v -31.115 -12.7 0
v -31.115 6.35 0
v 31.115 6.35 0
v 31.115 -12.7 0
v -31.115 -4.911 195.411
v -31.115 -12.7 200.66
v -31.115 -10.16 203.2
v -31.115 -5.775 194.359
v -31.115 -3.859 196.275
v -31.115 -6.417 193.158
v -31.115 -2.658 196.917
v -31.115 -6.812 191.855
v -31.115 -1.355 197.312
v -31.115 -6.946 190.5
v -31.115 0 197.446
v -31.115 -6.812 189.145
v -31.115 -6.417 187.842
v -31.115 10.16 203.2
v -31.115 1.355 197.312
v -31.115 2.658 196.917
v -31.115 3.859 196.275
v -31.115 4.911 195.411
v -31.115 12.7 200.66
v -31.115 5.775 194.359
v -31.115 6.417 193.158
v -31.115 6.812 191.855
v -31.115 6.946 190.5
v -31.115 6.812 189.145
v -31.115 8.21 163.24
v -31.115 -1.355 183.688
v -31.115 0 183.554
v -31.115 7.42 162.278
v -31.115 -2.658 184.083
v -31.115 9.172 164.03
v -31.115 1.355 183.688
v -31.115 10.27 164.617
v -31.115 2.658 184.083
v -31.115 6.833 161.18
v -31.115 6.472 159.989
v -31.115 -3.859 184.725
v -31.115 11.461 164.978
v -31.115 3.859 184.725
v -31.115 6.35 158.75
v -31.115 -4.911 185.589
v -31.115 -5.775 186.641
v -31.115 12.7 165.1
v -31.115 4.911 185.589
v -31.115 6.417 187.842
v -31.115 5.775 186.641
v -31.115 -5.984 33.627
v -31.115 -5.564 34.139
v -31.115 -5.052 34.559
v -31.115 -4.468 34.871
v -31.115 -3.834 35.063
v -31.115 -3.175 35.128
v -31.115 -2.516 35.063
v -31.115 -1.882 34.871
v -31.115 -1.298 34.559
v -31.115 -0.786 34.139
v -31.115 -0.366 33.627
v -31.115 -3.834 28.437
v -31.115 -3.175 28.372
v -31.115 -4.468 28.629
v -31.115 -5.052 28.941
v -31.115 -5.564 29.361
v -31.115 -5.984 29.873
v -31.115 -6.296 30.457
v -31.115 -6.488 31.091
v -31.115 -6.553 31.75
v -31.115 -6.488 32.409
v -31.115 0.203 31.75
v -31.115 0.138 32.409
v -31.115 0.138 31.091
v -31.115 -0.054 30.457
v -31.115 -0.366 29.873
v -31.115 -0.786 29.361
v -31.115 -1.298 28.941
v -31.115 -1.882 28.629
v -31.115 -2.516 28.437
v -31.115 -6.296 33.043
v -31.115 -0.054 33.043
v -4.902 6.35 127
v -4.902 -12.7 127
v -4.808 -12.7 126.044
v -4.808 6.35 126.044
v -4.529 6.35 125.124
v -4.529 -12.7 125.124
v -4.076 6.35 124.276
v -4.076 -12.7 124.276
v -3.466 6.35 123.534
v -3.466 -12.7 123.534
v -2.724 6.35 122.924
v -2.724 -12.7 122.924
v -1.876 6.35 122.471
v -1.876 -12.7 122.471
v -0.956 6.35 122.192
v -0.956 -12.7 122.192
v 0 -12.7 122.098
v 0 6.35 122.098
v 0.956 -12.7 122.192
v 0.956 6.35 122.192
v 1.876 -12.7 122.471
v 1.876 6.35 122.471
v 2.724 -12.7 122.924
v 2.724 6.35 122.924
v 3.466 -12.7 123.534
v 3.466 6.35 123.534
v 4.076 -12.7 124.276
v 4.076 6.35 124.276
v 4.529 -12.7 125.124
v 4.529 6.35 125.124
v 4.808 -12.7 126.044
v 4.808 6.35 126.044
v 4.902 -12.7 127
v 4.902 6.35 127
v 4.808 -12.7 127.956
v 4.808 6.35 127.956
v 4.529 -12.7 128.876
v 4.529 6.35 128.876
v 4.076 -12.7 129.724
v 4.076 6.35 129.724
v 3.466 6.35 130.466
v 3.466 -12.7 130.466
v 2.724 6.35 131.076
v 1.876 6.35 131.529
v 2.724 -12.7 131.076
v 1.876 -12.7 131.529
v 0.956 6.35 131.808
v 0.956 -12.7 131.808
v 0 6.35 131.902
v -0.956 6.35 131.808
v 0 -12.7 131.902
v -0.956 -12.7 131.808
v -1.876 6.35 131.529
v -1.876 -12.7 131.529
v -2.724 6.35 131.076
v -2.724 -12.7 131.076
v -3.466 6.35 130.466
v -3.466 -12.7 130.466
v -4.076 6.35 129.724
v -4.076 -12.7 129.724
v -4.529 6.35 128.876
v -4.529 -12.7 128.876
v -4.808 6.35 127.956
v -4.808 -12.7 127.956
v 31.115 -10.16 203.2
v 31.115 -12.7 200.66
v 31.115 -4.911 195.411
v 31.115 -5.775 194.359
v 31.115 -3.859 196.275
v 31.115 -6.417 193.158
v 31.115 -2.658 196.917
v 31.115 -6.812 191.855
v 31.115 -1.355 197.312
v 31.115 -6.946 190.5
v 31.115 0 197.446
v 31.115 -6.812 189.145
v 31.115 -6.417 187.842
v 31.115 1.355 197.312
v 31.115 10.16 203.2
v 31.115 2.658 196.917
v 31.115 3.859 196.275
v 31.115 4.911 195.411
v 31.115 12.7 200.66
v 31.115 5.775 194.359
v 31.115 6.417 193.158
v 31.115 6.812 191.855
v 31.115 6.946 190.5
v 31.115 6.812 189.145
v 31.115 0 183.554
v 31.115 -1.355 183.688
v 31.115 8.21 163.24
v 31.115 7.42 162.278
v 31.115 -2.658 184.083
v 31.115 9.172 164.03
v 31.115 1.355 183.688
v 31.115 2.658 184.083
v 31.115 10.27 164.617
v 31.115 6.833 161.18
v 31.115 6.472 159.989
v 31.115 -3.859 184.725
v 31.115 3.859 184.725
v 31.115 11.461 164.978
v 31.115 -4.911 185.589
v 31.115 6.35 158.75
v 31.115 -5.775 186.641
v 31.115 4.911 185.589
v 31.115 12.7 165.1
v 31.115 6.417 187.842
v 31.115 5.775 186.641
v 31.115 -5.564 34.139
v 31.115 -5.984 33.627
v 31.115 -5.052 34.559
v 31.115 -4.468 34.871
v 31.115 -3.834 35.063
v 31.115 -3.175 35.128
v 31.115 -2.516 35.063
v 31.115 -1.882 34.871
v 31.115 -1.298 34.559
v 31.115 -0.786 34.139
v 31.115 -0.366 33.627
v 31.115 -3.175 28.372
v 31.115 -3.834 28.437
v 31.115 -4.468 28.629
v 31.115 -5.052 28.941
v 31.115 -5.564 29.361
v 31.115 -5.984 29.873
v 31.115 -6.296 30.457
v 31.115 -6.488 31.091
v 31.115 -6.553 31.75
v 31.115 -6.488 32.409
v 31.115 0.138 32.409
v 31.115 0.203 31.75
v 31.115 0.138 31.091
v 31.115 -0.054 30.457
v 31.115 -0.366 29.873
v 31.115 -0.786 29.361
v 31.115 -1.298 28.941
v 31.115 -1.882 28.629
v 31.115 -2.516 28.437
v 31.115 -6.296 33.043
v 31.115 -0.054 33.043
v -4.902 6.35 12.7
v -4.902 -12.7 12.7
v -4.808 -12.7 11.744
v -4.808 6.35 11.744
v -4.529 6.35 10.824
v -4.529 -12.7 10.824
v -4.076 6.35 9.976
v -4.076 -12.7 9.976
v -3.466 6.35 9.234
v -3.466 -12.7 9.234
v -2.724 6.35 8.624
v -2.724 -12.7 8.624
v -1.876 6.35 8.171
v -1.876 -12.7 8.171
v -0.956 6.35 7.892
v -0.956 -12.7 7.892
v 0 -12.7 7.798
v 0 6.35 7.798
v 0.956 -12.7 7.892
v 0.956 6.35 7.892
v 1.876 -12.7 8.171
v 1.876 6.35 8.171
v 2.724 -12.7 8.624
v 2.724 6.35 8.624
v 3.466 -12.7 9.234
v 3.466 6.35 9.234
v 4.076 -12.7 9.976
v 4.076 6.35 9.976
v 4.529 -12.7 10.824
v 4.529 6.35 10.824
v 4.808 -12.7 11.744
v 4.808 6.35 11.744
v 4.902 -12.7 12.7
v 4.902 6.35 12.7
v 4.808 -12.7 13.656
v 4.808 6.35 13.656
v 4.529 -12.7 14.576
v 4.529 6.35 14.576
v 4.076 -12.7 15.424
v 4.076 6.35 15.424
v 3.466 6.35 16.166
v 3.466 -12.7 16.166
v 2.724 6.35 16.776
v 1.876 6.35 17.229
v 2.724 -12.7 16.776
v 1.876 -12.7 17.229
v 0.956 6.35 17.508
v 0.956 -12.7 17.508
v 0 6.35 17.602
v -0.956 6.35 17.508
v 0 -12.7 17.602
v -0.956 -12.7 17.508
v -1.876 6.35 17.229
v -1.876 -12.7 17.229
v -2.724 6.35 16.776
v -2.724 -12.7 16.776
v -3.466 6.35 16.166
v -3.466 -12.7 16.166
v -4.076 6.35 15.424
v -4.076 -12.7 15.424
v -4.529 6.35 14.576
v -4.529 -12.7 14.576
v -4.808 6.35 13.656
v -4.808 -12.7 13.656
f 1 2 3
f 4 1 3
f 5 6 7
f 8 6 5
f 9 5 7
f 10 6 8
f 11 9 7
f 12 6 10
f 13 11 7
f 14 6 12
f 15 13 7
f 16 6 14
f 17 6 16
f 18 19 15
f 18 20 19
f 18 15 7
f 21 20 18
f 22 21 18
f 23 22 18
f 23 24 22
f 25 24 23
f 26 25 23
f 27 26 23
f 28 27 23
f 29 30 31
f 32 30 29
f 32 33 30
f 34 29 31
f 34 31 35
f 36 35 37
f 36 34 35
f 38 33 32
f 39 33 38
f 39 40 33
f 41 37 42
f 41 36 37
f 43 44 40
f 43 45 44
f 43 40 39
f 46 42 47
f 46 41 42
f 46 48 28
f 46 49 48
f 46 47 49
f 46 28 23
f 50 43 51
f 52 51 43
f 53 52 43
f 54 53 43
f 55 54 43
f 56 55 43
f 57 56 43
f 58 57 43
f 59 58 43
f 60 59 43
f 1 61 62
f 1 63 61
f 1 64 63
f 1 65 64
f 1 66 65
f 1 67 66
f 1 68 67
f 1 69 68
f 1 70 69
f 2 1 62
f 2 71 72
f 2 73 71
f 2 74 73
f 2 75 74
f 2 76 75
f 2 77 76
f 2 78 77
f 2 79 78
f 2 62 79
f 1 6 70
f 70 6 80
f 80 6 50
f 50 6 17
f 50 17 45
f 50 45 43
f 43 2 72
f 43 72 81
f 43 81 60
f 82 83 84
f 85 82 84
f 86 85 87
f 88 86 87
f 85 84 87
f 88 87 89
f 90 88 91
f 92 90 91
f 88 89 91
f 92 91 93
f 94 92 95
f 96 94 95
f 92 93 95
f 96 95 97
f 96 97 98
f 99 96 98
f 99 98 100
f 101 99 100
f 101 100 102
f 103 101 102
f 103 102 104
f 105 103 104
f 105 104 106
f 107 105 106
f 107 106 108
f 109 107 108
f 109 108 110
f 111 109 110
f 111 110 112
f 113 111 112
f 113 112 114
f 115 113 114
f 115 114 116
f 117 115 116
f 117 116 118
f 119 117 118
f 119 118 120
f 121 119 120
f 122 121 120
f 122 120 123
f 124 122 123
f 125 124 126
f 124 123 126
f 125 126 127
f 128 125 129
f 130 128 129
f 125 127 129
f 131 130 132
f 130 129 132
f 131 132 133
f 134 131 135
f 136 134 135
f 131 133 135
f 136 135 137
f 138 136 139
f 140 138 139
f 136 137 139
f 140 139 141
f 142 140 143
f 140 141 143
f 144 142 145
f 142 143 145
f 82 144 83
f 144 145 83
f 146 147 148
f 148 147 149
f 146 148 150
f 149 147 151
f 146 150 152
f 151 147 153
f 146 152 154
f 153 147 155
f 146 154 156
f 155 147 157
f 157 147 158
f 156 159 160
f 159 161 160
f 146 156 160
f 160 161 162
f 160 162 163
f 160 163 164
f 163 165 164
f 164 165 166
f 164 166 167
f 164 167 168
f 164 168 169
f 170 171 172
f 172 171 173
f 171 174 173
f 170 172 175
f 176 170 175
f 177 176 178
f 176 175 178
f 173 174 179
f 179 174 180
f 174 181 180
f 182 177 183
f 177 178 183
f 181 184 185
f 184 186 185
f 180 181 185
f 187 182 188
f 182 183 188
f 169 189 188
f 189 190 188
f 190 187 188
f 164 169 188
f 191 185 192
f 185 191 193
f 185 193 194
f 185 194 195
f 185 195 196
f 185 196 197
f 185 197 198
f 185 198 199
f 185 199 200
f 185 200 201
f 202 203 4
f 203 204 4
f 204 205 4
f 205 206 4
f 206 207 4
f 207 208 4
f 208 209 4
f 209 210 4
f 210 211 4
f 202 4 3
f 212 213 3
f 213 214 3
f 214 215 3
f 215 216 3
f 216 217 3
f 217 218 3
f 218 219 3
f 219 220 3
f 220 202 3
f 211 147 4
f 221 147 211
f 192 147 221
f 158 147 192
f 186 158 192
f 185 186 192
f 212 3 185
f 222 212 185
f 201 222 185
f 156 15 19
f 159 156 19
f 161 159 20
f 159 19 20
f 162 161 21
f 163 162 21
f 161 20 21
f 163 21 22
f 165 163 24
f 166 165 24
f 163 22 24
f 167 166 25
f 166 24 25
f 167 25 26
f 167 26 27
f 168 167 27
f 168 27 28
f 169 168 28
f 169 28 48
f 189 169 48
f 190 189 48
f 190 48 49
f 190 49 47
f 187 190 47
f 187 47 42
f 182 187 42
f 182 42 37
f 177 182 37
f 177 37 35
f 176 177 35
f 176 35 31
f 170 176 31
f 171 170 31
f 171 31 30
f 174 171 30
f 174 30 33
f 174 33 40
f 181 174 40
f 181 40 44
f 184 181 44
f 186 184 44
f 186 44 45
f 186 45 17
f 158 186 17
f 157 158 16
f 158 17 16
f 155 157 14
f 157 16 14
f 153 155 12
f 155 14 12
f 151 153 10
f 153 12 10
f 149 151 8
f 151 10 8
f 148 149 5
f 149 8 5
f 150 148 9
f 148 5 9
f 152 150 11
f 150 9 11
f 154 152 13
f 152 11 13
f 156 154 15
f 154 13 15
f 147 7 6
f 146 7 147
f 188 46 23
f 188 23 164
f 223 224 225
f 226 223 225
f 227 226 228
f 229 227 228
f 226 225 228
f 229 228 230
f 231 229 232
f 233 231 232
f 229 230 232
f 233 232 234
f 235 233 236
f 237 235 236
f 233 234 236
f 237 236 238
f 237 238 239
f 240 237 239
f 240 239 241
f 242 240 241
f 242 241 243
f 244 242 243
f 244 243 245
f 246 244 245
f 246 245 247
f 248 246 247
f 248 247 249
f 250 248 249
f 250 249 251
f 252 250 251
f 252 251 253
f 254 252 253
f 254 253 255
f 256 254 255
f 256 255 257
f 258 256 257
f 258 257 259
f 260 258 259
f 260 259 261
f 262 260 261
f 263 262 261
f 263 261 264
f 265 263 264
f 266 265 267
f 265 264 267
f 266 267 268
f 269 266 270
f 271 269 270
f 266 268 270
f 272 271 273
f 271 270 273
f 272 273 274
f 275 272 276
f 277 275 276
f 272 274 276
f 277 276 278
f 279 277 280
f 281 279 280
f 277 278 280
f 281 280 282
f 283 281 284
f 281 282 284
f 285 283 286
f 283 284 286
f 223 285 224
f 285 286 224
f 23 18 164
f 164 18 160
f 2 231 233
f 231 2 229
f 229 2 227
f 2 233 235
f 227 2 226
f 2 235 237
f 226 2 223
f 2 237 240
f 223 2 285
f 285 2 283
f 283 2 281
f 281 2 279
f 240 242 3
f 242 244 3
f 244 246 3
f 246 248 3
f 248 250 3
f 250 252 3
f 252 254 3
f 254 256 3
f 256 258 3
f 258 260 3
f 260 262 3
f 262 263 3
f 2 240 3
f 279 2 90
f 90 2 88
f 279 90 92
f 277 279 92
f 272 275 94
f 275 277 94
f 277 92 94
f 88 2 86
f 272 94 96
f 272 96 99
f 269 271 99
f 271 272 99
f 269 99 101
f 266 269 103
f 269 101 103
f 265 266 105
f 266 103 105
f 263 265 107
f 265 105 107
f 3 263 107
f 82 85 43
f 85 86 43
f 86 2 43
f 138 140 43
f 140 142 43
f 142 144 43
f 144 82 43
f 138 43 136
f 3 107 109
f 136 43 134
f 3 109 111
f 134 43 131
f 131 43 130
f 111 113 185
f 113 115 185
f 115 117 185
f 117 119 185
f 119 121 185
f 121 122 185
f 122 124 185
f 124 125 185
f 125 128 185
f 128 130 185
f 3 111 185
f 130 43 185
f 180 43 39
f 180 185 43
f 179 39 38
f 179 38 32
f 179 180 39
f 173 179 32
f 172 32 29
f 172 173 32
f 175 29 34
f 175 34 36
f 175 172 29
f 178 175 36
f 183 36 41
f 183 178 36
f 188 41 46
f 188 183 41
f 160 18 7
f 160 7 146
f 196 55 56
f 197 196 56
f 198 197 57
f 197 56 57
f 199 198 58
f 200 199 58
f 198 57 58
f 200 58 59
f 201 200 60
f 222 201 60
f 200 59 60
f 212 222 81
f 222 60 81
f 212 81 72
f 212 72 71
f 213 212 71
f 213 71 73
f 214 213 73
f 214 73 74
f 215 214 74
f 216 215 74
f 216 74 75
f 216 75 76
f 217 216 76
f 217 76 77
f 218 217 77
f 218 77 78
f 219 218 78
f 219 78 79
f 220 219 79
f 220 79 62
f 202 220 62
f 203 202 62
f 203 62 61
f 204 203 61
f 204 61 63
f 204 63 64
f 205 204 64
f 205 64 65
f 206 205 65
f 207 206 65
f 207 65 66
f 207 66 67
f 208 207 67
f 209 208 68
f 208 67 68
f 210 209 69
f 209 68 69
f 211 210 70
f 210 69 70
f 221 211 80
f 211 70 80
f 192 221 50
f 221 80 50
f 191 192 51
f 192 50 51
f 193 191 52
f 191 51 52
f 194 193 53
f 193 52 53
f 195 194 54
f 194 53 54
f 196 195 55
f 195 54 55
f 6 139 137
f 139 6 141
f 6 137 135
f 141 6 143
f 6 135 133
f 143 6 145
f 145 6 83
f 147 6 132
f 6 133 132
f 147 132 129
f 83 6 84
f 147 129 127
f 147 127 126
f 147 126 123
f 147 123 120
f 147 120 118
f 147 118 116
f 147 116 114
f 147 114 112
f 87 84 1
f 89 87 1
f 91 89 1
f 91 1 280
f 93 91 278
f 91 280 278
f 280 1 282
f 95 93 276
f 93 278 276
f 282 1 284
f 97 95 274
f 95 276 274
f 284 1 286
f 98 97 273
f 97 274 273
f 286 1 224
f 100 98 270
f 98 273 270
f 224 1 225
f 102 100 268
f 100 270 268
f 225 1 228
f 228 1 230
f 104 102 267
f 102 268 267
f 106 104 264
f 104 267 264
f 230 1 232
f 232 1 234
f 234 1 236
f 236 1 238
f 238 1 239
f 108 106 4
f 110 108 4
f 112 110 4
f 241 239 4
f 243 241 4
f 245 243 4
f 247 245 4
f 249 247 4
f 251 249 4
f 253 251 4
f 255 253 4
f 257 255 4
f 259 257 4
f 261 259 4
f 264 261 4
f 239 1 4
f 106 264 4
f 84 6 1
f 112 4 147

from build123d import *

# Parameters (mm, degrees)
SKETCH1_W               = 62.23
SKETCH1_H               = 25.4
BOSS_EXTRUDE1_DEPTH     = 203.2
F_3_8_CLEARANCE_HOLE1_D = 9.8044
F_1_2_CLEARANCE_HOLE1_D = 13.89126
SKETCH16_W              = 62.23
SKETCH16_H              = 165.1
CUT_EXTRUDE2_DEPTH      = 6.35
FILLET1_R               = 6.35
CHAMFER1_SIZE           = 2.54
F_1_4_CLEARANCE_HOLE1_D = 6.7564


with BuildPart() as part:
    # Sketch1 → Boss-Extrude1 (new body)
    with BuildSketch(Plane.XY):
        Rectangle(SKETCH1_W, SKETCH1_H)
    extrude(amount=BOSS_EXTRUDE1_DEPTH)

    # 3/8 Clearance Hole1 (through all)
    with Locations(Plane(origin=(0, 12.7, 0), x_dir=(1, 0, 0), z_dir=(0, 1, 0))):
        with Locations((0, -12.7), (0, -127)):
            Hole(F_3_8_CLEARANCE_HOLE1_D / 2)

    # 1/2 Clearance Hole1 (through all)
    with Locations(Plane(origin=(31.115, 0, 0), x_dir=(0, 0, -1), z_dir=(1, 0, 0))):
        with Locations((-190.5, 0)):
            Hole(F_1_2_CLEARANCE_HOLE1_D / 2)

    # Sketch16 → Cut-Extrude2 (cut)
    with BuildSketch(Plane.XZ.offset(-12.7)):
        with Locations((0, 82.55)):
            Rectangle(SKETCH16_W, SKETCH16_H)
    extrude(amount=CUT_EXTRUDE2_DEPTH, mode=Mode.SUBTRACT)

    # Fillet1
    fillet1_edges = [part.edges().sort_by_distance(p)[0] for p in [
        (0, 6.35, 165.1),
    ]]
    fillet(fillet1_edges, radius=FILLET1_R - 0.0001)  # a hair under: the kernel refuses the full size

    # Chamfer1
    chamfer1_edges = [part.edges().sort_by_distance(p)[0] for p in [
        (0, -12.7, 203.2),
        (0, 12.7, 203.2),
    ]]
    chamfer(chamfer1_edges, length=CHAMFER1_SIZE)

    # 1/4 Clearance Hole1 (through all)
    with Locations(Plane(origin=(31.115, 0, 0), x_dir=(0, 0, -1), z_dir=(1, 0, 0))):
        with Locations((-31.75, -3.175)):
            Hole(F_1_4_CLEARANCE_HOLE1_D / 2)


solid = part.part
